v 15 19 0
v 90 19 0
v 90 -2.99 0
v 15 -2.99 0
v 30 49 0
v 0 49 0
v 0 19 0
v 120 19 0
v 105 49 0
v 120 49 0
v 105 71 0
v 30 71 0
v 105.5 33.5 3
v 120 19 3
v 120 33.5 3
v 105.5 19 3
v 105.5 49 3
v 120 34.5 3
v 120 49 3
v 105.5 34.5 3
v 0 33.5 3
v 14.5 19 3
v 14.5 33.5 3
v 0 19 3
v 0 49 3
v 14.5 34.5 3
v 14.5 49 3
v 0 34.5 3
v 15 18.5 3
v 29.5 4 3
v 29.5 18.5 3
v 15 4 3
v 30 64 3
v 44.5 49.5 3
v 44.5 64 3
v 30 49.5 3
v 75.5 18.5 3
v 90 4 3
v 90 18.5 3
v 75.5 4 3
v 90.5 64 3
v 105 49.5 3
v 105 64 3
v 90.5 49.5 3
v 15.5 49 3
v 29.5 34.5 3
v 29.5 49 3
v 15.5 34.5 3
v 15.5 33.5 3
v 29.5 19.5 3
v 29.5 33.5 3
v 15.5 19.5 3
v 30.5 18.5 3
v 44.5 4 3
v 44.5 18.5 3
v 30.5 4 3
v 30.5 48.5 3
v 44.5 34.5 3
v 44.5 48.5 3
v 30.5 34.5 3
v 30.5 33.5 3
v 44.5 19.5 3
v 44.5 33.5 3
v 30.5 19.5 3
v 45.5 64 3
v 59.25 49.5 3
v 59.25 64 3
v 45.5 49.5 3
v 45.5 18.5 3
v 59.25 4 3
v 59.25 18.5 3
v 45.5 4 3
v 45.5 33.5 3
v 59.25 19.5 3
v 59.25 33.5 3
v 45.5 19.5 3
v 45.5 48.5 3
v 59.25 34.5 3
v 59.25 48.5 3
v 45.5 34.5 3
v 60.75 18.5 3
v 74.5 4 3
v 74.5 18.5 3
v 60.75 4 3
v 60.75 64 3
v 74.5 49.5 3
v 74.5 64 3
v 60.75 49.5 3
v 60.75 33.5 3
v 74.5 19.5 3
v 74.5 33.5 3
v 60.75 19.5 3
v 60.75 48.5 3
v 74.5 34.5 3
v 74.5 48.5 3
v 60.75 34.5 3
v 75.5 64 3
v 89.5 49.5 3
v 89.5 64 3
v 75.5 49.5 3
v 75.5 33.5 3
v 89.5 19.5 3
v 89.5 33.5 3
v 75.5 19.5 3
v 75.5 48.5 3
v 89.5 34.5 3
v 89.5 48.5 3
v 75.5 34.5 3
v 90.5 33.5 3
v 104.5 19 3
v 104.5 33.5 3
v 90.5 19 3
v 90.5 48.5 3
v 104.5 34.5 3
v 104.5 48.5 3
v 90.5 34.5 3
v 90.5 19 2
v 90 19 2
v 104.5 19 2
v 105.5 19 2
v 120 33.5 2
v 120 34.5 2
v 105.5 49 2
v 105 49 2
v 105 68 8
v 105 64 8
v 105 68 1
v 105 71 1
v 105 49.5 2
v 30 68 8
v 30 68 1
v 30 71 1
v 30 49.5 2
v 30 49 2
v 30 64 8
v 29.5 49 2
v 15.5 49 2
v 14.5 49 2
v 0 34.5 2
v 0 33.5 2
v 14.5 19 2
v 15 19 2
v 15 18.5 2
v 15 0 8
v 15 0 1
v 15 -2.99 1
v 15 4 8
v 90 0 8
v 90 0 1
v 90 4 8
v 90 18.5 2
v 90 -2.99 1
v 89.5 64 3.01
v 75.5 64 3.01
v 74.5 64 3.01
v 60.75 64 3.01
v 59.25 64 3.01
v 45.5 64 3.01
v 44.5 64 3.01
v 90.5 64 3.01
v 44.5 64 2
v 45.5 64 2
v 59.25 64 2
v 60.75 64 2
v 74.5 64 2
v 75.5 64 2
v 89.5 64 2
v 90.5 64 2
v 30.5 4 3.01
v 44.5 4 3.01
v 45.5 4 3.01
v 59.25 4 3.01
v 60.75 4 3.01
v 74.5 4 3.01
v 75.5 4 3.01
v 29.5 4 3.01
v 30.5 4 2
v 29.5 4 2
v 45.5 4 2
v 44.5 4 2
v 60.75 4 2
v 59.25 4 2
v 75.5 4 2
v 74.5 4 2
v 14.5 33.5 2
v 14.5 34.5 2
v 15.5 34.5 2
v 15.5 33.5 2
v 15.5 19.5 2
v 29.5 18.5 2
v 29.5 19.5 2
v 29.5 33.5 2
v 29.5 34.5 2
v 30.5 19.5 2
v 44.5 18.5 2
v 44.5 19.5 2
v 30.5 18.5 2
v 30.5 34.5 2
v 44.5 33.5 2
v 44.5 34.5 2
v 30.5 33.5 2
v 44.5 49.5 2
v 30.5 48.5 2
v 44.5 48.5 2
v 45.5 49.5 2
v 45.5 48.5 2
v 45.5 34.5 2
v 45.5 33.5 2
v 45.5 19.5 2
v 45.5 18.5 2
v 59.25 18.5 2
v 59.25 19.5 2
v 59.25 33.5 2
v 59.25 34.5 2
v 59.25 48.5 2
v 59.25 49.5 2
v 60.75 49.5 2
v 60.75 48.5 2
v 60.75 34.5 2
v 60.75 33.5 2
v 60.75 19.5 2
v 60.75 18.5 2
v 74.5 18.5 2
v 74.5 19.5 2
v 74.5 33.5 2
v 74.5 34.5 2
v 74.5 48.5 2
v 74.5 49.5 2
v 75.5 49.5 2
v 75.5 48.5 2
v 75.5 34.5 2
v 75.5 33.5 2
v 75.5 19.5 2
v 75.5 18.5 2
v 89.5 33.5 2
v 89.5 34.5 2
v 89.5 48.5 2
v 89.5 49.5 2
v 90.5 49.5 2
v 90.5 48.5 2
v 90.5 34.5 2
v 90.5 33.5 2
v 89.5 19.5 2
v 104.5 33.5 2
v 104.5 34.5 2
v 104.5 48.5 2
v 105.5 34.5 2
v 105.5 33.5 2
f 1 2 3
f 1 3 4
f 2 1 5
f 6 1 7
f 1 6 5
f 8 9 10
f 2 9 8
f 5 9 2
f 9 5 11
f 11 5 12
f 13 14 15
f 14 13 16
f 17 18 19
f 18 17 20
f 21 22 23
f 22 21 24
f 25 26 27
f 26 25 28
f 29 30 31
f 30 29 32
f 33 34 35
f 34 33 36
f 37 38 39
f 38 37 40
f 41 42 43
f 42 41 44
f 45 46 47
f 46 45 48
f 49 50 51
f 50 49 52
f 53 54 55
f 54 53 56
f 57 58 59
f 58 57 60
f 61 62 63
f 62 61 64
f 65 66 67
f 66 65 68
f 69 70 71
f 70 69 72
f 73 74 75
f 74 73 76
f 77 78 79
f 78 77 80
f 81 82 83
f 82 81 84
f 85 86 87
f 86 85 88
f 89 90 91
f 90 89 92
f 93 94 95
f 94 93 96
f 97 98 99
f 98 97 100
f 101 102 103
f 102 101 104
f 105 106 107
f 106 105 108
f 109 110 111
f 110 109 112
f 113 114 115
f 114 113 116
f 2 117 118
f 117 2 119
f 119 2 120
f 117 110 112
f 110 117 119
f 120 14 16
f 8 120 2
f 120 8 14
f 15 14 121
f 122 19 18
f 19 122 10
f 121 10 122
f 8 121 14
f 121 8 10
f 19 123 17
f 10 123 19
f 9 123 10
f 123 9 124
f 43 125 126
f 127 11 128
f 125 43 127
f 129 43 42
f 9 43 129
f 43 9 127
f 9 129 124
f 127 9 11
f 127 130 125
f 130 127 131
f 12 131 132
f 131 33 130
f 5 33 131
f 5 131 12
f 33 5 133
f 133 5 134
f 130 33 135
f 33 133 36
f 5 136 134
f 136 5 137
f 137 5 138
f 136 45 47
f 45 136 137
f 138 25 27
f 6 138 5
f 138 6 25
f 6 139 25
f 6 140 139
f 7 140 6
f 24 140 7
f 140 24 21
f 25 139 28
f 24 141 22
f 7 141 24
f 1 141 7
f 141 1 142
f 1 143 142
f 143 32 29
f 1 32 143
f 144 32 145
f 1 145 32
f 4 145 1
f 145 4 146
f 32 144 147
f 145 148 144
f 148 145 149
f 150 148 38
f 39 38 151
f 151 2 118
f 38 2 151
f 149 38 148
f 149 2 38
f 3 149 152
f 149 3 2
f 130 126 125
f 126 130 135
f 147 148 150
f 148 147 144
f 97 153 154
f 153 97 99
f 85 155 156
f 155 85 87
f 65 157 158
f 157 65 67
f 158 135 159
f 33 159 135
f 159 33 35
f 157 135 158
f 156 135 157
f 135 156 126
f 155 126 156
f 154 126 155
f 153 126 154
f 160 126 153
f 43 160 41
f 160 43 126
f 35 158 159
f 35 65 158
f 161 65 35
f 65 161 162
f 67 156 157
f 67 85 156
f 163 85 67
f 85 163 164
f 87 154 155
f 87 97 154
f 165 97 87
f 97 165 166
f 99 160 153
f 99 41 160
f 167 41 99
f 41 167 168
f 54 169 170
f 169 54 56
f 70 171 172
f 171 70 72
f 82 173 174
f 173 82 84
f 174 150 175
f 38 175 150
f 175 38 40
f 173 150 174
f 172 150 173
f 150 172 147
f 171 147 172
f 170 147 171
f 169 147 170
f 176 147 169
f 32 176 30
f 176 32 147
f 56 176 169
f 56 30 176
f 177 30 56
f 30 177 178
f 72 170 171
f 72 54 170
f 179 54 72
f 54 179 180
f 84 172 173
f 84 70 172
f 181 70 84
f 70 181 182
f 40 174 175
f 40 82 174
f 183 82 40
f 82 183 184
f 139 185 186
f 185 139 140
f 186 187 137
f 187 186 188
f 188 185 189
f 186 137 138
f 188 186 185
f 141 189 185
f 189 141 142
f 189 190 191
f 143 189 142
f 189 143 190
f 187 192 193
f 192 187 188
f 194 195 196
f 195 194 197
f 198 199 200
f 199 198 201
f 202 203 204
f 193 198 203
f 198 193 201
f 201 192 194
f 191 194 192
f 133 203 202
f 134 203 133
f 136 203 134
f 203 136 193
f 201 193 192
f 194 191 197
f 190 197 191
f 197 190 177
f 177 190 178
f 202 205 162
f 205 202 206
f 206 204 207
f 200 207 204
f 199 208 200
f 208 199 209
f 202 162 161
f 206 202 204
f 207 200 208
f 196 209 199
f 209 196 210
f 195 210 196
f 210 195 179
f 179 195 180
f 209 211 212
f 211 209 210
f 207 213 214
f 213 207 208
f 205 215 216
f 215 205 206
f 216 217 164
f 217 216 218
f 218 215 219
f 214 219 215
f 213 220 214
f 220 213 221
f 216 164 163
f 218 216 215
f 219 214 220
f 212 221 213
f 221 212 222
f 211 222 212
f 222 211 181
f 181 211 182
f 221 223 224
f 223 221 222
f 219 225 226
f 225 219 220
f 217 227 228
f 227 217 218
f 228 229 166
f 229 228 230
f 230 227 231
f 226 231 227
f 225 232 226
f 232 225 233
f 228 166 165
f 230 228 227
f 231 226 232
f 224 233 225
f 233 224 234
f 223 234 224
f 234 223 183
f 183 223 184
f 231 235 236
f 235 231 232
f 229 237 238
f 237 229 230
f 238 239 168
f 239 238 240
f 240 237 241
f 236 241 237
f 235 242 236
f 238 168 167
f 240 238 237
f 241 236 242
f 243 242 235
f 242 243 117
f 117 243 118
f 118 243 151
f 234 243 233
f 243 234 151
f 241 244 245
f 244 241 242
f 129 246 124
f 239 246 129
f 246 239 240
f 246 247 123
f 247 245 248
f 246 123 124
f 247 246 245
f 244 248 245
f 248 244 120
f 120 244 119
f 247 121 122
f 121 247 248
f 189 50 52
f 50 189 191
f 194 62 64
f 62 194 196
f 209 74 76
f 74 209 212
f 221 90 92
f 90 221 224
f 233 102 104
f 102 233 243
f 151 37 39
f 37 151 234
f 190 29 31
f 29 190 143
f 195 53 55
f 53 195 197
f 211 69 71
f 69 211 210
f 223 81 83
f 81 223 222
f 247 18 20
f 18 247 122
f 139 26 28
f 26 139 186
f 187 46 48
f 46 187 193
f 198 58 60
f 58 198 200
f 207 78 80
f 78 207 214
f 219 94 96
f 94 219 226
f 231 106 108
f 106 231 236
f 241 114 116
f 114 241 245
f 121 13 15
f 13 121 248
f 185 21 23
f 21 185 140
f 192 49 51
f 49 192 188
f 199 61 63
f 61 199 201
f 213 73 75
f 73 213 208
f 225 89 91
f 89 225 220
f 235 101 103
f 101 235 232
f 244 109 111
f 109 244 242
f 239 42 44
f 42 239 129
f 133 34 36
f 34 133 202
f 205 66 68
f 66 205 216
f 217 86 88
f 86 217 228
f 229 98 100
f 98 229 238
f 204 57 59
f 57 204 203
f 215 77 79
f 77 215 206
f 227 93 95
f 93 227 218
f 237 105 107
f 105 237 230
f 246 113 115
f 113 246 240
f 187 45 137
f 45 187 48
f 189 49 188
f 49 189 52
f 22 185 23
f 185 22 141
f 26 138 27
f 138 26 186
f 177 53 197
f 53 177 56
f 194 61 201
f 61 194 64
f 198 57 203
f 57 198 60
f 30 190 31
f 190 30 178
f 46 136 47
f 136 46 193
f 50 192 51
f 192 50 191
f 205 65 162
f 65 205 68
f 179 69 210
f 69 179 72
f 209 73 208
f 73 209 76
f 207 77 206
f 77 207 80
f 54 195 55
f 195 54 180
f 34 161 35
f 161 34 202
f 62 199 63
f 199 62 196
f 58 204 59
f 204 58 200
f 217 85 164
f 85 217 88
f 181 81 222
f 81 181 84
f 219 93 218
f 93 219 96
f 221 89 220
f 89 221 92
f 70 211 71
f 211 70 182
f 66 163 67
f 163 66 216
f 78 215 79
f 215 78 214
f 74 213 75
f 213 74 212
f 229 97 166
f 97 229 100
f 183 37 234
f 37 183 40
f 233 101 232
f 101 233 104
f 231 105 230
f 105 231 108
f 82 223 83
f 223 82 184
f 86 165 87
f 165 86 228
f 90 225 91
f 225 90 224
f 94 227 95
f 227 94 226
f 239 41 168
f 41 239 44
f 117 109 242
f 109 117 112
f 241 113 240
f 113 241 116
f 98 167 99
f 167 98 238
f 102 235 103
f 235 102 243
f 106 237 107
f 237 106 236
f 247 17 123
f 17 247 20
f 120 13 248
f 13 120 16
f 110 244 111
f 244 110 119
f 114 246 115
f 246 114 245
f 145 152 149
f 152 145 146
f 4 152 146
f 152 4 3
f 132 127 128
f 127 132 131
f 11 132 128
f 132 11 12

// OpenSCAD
scaleFactor = 1;
squareSize = 15;
pieceTolerance = 0.3;
slitWidth = 1;
thickSlitWidth = 1.5;
slitDepth = 1;
boardThickness = 3;
pieceBaseHeight = 5;
insetRatio = .8;
pyramidHeight = 16;
pusherHeight = 8;
pusherWall = 0.75;
anchorTolerance = 0;
anchorPyramidHeight = 12;
anchorTaper = 0.8;
sideWall = 4;
rounding = .07;
boardEdgeWidth = 3;
boardEdgeThickness = 1;
pyramidTipRatio = 0.2;
item = 0; // [0:Board,1:Pyramid,2:Pusher,3:Anchor]

module dummy(){}

pieceSize = squareSize-pieceTolerance;
nudge = 0.01;

module rsquare(l) {
    r = l * rounding;
    hull() {
        for (x=[-1,1])
            for (y=[-1,1])
                translate([(l/2-r)*x,(l/2-r)*y]) circle(r=r,$fn=16);
    }
}

module pieceBase(h=pieceBaseHeight,w=pieceSize,taper=1.) {
    linear_extrude(height=h+nudge,scale=1/taper) scale(taper) rsquare(w);
}

module pyramid(h1=pieceBaseHeight,h2=pyramidHeight,pieceSize=pieceSize,taper=1) {
    pieceBase(h1,pieceSize,taper);
    translate([0,0,h1])
    linear_extrude(height=h2,scale=pyramidTipRatio)
        rsquare(pieceSize*insetRatio);
}

module pusher() {
    pieceBase();
    translate([0,0,pieceBaseHeight])
        linear_extrude(height=pusherHeight)
            difference() {
                rsquare(insetRatio*pieceSize);
                rsquare(insetRatio*pieceSize-pusherWall*2);
            }
}

module anchor() {
    outer = insetRatio*pieceSize-pusherWall*2-anchorTolerance*2;
    pyramid(pusherHeight,anchorPyramidHeight,outer,anchorTaper);
}

module boardBottom() {
    difference() {
        square([8*squareSize,2*sideWall+4*squareSize]);
        translate([-nudge,-nudge]) square([squareSize+nudge,squareSize+sideWall+nudge]);
        translate([6*squareSize,-nudge]) square([2*squareSize+nudge,squareSize+sideWall+nudge]);
        translate([-nudge,3*squareSize+sideWall]) square([2*squareSize+nudge,squareSize+sideWall+nudge]);
        translate([7*squareSize,3*squareSize+sideWall]) square([squareSize+nudge,squareSize+sideWall+nudge]);
    }
}

module sideWalls() {
    translate([squareSize,0]) square([5*squareSize,sideWall]);
    translate([2*squareSize,sideWall+4*squareSize]) square([5*squareSize,sideWall]);
}

module solidBoard() {
    linear_extrude(height=boardThickness) boardBottom();
    linear_extrude(height=boardThickness+pieceBaseHeight) sideWalls();
}

module hslit(x,y,w,slitWidth=slitWidth) {
    translate([x*squareSize,sideWall+y*squareSize-slitWidth/2,boardThickness-slitDepth]) cube([w*squareSize,slitWidth,slitDepth+nudge]);
}

module vslit(x,y,h,slitWidth=slitWidth) {
    translate([x*squareSize-slitWidth/2,sideWall+y*squareSize,boardThickness-slitDepth]) cube([slitWidth,h*squareSize,slitDepth+nudge]);
}

module board() {
   
    render(convexity=2)
    difference() {
        solidBoard();
        hslit(1,1,5);
        hslit(0,2,8);
        hslit(2,3,5);
        vslit(1,1,2);
        vslit(2,0,3);
        vslit(3,0,4);
        vslit(4,0,4,slitWidth=thickSlitWidth);
        vslit(5,0,4);
        vslit(6,1,3);
        vslit(7,1,2);        
    }
    translate([squareSize,nudge-boardEdgeWidth,0])
    cube([5*squareSize,boardEdgeWidth+nudge,boardEdgeThickness]);
    translate([2*squareSize,sideWall+4*squareSize+sideWall-nudge,0])
    cube([5*squareSize,boardEdgeWidth+nudge,boardEdgeThickness]);
}

if (item==0) board();
else if (item==1) pyramid();
else if (item==2) pusher();
else if (item==3) anchor();
